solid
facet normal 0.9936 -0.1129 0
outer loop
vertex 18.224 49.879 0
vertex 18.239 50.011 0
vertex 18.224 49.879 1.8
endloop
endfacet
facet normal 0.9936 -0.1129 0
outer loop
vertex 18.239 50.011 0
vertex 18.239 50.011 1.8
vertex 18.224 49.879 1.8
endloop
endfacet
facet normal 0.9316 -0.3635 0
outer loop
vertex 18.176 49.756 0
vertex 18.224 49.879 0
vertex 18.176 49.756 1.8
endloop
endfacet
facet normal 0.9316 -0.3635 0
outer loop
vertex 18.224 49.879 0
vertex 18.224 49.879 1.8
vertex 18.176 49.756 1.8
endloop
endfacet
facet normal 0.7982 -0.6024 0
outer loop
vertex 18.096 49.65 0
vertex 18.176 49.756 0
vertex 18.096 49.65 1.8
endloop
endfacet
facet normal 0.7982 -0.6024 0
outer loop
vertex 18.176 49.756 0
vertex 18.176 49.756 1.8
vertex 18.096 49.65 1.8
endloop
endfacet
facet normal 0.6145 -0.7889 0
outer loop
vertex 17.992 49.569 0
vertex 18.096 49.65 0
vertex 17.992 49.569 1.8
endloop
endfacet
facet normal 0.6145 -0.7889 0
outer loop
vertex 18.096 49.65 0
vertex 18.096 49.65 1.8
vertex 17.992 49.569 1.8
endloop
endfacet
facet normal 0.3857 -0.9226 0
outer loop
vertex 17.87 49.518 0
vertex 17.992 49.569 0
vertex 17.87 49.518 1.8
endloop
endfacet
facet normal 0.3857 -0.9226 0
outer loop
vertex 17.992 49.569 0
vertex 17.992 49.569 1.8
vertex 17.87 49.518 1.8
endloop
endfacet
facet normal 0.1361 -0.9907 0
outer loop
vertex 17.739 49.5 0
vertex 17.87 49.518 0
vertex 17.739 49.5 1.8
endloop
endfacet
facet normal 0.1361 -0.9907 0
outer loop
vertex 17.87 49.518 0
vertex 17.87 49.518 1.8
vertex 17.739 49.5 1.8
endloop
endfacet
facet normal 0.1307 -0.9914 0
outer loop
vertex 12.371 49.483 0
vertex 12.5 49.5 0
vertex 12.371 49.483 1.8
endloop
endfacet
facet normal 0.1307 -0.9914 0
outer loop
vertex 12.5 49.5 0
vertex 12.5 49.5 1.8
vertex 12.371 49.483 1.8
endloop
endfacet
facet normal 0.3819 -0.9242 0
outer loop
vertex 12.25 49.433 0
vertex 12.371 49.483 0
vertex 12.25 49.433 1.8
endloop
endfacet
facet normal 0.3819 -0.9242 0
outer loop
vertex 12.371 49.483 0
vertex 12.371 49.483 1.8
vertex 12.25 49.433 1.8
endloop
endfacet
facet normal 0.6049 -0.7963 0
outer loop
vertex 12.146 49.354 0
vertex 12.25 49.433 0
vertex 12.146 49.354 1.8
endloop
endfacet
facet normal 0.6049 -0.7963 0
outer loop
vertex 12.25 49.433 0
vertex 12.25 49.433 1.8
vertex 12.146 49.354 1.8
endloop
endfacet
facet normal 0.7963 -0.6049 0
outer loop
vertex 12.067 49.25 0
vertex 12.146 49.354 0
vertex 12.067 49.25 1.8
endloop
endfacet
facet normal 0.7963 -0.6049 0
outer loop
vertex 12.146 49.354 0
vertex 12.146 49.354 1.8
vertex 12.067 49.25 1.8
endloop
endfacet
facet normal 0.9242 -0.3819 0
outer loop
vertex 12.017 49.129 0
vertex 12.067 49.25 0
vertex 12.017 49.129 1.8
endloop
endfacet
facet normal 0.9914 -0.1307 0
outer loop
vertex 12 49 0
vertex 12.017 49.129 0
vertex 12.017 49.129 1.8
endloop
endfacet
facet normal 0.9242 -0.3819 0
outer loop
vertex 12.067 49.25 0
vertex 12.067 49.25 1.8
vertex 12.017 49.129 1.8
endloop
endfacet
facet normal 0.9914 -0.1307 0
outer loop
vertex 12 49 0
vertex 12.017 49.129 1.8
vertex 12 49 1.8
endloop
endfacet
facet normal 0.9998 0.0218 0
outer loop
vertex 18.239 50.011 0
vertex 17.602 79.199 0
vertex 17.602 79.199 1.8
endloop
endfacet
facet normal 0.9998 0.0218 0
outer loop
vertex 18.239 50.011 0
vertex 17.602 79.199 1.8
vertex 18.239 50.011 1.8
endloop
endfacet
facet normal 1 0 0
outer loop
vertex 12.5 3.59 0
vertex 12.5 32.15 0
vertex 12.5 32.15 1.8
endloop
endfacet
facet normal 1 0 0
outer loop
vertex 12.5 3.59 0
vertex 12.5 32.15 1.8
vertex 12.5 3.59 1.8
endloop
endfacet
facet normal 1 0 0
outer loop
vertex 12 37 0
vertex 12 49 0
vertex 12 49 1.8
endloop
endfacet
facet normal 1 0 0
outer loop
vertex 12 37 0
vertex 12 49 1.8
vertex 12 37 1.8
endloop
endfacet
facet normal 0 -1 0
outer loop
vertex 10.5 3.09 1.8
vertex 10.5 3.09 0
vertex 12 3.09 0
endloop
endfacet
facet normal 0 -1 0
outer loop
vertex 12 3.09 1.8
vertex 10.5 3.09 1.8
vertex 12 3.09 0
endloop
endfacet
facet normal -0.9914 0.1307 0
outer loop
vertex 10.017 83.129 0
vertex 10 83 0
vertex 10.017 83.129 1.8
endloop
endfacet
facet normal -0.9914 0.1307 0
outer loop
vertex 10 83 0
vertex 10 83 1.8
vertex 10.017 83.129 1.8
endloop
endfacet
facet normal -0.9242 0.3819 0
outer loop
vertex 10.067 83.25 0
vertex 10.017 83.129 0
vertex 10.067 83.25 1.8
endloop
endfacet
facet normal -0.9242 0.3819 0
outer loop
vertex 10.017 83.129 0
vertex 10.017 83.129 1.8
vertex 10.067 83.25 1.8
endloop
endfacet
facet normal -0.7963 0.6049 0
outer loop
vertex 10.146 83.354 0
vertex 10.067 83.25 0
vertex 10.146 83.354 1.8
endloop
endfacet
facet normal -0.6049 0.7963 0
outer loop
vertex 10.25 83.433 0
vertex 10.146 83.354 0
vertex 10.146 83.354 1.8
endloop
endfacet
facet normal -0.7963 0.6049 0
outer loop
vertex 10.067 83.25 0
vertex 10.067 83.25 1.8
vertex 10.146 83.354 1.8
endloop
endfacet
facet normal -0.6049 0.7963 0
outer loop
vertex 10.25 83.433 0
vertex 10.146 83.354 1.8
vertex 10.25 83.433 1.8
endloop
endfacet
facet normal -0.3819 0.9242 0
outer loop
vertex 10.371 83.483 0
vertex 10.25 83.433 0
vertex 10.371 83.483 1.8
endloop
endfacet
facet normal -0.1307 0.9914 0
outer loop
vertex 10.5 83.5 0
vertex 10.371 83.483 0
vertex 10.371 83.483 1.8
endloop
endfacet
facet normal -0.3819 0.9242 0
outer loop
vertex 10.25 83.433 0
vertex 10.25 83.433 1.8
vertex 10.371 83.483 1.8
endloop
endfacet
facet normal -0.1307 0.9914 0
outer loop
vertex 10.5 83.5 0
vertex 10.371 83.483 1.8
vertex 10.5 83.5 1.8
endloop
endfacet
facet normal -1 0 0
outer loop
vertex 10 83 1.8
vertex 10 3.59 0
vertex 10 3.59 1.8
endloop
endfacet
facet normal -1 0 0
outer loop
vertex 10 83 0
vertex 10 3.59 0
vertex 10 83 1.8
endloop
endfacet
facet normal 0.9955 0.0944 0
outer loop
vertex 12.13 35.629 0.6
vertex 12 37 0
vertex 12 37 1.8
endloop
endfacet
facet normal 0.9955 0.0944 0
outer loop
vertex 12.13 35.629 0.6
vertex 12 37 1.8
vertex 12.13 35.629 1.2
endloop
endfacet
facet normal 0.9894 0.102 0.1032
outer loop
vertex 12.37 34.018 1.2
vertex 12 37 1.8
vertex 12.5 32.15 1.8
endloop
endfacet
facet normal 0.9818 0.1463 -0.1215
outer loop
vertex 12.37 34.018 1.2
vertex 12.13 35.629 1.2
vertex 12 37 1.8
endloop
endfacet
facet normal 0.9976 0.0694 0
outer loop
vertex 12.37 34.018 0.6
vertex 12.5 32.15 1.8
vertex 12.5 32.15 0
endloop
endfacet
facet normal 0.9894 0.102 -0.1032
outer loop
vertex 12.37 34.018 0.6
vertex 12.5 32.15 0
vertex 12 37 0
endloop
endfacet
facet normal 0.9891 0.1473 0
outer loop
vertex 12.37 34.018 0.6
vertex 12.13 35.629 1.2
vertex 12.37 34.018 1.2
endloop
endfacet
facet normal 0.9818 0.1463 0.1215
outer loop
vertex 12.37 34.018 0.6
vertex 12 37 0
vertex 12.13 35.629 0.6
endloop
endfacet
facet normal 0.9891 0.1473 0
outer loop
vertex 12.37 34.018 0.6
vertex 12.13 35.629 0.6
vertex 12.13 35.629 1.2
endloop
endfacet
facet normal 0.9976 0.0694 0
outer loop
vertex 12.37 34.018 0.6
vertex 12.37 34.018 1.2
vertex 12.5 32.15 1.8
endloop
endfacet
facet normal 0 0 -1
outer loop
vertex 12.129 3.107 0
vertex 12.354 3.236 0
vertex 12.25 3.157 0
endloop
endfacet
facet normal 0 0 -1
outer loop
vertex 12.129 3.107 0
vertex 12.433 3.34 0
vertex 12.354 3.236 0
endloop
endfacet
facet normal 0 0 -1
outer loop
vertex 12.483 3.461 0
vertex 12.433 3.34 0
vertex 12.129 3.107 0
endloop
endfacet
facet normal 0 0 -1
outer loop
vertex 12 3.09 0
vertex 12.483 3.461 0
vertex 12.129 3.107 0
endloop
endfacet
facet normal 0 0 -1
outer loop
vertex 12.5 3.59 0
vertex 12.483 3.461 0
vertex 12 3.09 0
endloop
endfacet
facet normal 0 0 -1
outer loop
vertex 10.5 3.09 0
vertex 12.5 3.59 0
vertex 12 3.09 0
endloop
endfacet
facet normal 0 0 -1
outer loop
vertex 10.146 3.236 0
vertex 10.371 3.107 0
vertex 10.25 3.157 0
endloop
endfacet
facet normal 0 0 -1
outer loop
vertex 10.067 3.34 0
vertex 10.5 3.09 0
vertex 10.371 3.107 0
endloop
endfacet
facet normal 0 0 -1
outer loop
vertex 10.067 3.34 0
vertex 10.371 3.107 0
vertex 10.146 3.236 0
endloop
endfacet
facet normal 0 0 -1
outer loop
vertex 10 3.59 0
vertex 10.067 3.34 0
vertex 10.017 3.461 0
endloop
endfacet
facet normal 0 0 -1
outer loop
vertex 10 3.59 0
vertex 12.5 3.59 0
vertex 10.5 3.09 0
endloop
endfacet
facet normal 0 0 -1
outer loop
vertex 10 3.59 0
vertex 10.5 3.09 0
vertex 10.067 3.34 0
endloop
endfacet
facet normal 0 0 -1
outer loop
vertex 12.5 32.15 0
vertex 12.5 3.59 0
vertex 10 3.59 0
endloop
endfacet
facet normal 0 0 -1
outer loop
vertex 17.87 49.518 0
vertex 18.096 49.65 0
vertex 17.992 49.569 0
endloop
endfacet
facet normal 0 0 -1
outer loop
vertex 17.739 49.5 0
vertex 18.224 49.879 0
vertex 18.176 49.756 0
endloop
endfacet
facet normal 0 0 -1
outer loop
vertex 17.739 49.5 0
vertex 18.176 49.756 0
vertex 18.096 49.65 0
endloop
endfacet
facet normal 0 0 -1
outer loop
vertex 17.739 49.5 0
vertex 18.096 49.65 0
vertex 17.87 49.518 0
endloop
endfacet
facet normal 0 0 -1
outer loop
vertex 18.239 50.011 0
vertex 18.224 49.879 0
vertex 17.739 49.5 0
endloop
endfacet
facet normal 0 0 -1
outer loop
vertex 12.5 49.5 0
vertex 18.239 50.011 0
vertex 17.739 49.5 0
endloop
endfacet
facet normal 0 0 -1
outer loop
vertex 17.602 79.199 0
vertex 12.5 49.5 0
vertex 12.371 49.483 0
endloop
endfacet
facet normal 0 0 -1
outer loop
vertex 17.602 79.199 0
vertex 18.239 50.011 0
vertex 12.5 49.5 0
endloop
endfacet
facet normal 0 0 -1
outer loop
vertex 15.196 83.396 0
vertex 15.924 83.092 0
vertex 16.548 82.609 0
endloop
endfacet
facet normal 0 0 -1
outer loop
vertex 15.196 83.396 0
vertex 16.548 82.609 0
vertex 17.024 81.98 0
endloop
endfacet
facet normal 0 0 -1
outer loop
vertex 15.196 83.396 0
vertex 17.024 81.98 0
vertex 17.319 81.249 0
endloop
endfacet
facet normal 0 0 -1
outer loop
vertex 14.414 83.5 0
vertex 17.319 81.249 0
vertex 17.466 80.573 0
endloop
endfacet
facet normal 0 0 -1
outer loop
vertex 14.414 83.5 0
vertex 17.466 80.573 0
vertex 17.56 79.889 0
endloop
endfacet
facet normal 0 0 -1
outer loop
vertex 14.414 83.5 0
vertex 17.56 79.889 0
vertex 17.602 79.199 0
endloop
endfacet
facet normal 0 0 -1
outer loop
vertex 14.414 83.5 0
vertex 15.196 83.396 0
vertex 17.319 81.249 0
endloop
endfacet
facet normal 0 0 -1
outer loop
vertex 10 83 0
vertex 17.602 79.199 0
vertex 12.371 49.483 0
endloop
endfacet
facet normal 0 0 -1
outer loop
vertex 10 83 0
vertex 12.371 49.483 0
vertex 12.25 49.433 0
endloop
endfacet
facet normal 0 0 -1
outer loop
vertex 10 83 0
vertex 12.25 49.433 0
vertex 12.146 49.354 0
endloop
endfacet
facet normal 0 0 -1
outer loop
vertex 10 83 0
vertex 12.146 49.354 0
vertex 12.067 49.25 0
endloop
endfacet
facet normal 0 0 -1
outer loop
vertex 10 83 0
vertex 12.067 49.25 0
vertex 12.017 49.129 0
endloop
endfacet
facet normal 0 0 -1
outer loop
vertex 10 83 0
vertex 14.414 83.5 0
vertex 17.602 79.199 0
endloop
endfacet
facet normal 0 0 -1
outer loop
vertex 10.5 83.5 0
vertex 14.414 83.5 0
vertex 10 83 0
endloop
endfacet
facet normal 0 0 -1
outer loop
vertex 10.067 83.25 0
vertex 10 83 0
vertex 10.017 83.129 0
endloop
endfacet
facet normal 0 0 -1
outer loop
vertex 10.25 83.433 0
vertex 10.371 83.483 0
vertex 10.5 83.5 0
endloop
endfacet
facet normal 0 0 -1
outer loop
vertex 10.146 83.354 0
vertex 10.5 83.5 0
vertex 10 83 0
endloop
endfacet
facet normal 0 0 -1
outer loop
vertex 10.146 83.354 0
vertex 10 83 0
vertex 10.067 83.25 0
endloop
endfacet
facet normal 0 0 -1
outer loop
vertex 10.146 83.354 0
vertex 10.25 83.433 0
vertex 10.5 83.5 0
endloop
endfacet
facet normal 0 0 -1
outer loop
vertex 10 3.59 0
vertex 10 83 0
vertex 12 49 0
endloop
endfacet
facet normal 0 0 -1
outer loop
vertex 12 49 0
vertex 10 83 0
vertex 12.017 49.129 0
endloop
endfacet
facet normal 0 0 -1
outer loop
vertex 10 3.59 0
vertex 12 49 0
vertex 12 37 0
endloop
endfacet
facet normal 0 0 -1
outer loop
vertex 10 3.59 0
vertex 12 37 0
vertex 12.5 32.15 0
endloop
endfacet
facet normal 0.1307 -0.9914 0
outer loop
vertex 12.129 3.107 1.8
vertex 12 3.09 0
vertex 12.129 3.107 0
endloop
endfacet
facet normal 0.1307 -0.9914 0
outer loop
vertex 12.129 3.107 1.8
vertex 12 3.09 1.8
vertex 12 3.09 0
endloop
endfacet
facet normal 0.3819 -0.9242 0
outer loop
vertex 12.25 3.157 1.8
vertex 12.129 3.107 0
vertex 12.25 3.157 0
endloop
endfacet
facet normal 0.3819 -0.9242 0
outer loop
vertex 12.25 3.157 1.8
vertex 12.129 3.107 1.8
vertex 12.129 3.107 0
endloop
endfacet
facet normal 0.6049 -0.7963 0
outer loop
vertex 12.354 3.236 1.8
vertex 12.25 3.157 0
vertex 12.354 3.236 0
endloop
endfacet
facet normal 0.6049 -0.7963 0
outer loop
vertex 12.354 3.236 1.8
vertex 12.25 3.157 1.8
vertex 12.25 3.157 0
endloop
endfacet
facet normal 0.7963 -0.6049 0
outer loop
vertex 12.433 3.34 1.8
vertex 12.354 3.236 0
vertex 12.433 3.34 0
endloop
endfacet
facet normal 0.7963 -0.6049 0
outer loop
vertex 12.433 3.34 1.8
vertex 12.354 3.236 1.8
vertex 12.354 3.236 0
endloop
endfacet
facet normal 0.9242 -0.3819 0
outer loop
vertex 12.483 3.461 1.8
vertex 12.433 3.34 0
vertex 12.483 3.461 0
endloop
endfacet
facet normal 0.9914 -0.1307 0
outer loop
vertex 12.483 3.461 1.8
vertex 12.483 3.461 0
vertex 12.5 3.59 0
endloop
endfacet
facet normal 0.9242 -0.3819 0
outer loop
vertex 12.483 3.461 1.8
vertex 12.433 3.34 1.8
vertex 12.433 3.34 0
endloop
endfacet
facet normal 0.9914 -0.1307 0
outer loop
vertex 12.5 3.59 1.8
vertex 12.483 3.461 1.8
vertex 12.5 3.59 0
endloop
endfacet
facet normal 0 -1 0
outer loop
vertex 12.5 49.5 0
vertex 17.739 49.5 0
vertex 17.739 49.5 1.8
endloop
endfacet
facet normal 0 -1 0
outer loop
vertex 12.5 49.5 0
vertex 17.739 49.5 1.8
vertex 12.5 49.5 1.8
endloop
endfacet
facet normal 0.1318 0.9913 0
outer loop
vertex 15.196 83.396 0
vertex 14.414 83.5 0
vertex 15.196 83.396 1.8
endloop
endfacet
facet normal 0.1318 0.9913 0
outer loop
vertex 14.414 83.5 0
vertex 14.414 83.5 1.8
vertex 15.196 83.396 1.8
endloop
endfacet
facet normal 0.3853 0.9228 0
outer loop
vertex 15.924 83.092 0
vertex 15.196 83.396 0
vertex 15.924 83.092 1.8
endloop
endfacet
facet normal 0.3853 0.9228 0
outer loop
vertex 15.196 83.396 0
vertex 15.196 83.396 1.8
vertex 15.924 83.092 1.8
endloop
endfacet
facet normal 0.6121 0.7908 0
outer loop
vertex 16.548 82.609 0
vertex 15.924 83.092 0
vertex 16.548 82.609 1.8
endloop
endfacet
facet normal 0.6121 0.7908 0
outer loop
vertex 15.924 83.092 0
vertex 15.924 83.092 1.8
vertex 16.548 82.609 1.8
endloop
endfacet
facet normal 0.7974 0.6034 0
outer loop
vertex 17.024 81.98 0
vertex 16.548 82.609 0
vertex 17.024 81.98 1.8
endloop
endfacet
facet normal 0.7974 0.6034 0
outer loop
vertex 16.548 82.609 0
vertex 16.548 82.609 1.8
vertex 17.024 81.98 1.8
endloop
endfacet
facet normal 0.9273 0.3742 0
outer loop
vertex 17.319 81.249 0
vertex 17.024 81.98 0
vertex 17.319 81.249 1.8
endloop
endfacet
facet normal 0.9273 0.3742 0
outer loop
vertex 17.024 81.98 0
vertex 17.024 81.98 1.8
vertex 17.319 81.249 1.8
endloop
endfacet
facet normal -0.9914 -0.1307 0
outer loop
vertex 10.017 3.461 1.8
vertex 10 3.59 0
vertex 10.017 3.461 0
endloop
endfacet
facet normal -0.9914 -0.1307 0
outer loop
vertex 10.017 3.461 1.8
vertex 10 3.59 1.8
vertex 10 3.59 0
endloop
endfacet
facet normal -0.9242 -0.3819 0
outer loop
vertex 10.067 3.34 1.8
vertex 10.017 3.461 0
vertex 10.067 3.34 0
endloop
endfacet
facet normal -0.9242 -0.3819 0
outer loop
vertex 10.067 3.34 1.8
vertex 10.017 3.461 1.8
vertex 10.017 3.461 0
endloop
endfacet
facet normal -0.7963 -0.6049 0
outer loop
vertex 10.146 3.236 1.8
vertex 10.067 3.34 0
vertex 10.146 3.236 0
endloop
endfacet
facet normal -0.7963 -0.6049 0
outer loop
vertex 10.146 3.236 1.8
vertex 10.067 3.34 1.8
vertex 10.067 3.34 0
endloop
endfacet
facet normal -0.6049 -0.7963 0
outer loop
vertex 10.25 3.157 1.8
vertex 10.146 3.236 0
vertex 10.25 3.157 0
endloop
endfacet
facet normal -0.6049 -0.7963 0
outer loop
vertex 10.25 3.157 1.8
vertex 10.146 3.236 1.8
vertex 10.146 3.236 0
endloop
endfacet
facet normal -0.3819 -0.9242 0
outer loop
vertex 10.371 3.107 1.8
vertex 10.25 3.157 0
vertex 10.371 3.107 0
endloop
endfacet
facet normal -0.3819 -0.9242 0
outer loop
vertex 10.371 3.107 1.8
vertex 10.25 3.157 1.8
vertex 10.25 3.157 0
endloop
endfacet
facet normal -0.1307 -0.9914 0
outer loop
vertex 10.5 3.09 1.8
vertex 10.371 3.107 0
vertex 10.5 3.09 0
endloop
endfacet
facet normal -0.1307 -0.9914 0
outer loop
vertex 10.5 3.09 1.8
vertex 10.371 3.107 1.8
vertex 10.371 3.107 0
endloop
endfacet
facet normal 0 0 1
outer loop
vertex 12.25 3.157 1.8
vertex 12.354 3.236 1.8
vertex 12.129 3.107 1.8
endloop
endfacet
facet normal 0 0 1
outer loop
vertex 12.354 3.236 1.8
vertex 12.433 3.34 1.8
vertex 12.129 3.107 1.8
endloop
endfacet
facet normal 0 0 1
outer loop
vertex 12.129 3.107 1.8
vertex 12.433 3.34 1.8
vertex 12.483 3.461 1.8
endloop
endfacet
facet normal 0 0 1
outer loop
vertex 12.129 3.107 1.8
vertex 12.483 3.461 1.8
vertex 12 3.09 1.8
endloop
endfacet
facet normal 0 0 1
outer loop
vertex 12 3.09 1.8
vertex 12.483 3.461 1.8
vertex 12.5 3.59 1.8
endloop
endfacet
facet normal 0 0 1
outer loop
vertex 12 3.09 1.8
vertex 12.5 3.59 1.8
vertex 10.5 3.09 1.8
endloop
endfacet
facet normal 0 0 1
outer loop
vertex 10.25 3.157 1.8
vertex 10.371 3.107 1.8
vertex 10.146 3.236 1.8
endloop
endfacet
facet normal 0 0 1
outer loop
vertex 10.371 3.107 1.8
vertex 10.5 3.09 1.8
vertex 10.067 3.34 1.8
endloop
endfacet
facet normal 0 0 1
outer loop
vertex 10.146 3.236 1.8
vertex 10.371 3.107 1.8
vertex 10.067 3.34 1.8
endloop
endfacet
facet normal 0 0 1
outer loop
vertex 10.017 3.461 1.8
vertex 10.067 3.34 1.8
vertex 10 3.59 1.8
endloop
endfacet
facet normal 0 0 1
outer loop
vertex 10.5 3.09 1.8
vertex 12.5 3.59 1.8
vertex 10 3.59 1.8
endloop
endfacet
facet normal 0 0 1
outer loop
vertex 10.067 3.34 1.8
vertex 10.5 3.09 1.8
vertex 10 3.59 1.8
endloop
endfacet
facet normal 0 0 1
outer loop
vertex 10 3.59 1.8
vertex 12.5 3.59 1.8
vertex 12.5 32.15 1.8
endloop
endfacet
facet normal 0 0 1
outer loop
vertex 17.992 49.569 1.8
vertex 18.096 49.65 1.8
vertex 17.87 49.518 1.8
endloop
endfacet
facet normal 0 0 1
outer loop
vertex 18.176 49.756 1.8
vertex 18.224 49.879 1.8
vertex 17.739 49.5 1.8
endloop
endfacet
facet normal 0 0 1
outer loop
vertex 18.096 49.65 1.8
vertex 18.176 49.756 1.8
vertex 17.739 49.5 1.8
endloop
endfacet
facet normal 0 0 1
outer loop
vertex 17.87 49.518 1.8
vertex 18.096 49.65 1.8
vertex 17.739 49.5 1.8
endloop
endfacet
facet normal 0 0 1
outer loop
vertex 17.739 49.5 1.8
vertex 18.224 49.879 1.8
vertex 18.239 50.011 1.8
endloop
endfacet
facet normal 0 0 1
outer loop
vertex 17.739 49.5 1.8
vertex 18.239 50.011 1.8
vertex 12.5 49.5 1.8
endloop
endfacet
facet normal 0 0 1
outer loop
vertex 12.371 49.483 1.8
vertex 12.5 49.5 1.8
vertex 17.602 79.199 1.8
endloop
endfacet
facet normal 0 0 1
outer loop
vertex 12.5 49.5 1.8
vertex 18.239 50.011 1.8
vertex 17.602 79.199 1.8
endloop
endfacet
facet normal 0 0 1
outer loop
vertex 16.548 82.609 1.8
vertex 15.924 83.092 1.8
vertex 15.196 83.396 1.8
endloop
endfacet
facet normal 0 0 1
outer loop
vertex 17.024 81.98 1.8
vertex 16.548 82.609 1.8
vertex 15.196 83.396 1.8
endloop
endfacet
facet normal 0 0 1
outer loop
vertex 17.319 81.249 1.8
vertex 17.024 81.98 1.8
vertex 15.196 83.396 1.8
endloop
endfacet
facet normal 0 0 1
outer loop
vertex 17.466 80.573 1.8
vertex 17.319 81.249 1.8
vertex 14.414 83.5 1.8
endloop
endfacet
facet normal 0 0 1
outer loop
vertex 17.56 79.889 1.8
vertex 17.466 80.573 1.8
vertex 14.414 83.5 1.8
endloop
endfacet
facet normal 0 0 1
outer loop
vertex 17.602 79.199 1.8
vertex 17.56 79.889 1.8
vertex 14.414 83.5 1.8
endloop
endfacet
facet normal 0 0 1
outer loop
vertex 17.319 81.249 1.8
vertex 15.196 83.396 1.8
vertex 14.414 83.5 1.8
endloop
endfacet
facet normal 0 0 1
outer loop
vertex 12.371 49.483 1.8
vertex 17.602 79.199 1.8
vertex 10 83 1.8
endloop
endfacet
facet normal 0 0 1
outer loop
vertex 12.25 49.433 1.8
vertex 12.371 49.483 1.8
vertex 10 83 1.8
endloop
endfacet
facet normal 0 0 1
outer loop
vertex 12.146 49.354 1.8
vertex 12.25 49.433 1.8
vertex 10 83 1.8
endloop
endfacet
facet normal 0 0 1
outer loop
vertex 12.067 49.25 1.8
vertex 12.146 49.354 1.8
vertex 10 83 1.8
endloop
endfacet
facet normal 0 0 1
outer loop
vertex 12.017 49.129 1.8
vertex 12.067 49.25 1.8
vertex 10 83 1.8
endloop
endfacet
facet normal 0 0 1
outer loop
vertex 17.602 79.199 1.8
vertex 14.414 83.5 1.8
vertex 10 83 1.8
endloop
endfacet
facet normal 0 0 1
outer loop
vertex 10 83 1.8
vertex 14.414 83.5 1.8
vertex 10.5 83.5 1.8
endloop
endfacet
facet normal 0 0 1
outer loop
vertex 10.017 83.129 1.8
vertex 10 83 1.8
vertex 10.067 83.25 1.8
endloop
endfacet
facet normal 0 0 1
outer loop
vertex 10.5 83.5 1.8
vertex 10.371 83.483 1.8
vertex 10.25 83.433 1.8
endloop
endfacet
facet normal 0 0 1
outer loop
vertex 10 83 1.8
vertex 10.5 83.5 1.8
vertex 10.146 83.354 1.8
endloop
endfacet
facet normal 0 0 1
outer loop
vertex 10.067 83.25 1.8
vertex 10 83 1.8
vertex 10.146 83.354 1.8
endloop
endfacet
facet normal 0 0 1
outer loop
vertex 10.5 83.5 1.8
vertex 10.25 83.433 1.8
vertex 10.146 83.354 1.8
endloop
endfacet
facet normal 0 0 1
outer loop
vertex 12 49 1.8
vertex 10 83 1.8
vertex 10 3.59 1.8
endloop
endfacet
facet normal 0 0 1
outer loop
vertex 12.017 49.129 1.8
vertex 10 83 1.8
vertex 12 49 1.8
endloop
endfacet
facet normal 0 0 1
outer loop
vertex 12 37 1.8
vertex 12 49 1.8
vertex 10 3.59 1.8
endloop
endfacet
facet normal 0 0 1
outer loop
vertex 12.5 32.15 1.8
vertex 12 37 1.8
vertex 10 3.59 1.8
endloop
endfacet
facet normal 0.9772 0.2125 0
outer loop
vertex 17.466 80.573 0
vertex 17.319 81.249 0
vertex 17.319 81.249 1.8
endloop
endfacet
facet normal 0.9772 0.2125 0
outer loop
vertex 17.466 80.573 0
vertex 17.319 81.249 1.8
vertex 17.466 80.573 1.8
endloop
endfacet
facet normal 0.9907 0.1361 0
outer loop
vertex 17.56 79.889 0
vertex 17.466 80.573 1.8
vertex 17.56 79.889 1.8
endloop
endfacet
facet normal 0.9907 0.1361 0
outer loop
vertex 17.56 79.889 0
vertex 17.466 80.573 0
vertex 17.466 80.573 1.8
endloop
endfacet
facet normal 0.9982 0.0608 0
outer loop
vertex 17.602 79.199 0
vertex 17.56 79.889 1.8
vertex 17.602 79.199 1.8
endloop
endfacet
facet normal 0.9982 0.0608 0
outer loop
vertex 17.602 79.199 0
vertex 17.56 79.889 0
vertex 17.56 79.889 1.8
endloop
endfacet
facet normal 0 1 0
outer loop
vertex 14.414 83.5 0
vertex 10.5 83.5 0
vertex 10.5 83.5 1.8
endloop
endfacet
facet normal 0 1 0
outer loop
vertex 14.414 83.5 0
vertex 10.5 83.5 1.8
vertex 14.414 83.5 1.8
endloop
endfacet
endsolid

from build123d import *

# Parameters (mm, degrees)
BOSS_EXTRUDE1_DEPTH = 1.8
FILLET1_R           = 0.5
SKETCH2_R           = 1.75
BOSS_EXTRUDE3_DEPTH = 1.8
CUT_EXTRUDE2_DEPTH  = 1.8
FILLET2_R           = 0.5
FILLET3_R           = 3


with BuildPart() as part:
    # Sketch1 → Boss-Extrude1 (new body)
    with BuildSketch(Plane.XY):
        with BuildLine():
            Line((0, 4.5), (0, 6.5))
            Line((0, 6.5), (6, 6.5))
            Line((6, 6.5), (6, 10.5))
            Line((6, 10.5), (10, 14.5))
            Line((10, 14.5), (10, 83.5))
            Line((10, 83.5), (16.4, 83.5))
            ThreePointArc((16.4, 83.5), (17.2719581, 81.425344658), (17.601960582, 79.199226044))
            Line((17.601960582, 79.199226044), (18.25, 49.5))
            Line((18.25, 49.5), (12, 49.5))
            Line((12, 49.5), (12, 37))
            add(Edge.make_bspline(
                [(12, 37), (12, 35.742192932), (12.5, 34.153450807), (12.5, 32.15)],
                knots=[0, 0, 0, 0, 1, 1, 1, 1], degree=3))
            Line((12.5, 32.15), (12.5, 2.89))
            ThreePointArc((12.5, 2.89), (11.653538598, 0.846461402), (9.61, 0))
            ThreePointArc((9.61, 0), (4.304293167, 1.180712741), (0, 4.5))
        make_face()
    extrude(amount=BOSS_EXTRUDE1_DEPTH)

    # Fillet1
    fillet1_edges = [part.edges().sort_by_distance(p)[0] for p in [
        (0, 4.5, 0.9),
        (0, 6.5, 0.9),
        (6, 6.5, 0.9),
        (6, 10.5, 0.9),
        (10, 14.5, 0.9),
        (10, 83.5, 0.9),
        (18.25, 49.5, 0.9),
        (12, 49.5, 0.9),
    ]]
    fillet(fillet1_edges, radius=FILLET1_R)

    # Sketch2 → Boss-Extrude3 (add)
    with BuildSketch(Plane.XY):
        with BuildLine():
            Line((7, -2.499596966), (7, 0.500403034))
            Line((7, 0.500403034), (11, 0.500403034))
            Line((11, 0.500403034), (11.824045318, -1.578286292))
            ThreePointArc((11.824045318, -1.578286292), (9.968981185, -4.955214332), (7, -2.499596966))
        make_face()
        with Locations((9.5, -2.499596966)):
            Circle(SKETCH2_R, mode=Mode.SUBTRACT)
    extrude(amount=BOSS_EXTRUDE3_DEPTH)

    # Sketch5 → Cut-Extrude2 (cut)
    with BuildSketch(Plane.XY):
        Polygon((10, 29.542425494), (10, 3.09), (19.868157727, 3.09), (19.868157727, -10.013619472), (-11.195906999, -10.013619472), (-11.195906999, 29.542425494), align=None)
    extrude(amount=CUT_EXTRUDE2_DEPTH, mode=Mode.SUBTRACT)

    # Fillet2
    fillet2_edges = [part.edges().sort_by_distance(p)[0] for p in [
        (10, 3.09, 0.9),
        (12.5, 3.09, 0.9),
    ]]
    fillet(fillet2_edges, radius=FILLET2_R)

    # Fillet3
    fillet3_edges = [part.edges().sort_by_distance(p)[0] for p in [
        (16.4, 83.5, 0.9),
    ]]
    fillet(fillet3_edges, radius=FILLET3_R)


solid = part.part
